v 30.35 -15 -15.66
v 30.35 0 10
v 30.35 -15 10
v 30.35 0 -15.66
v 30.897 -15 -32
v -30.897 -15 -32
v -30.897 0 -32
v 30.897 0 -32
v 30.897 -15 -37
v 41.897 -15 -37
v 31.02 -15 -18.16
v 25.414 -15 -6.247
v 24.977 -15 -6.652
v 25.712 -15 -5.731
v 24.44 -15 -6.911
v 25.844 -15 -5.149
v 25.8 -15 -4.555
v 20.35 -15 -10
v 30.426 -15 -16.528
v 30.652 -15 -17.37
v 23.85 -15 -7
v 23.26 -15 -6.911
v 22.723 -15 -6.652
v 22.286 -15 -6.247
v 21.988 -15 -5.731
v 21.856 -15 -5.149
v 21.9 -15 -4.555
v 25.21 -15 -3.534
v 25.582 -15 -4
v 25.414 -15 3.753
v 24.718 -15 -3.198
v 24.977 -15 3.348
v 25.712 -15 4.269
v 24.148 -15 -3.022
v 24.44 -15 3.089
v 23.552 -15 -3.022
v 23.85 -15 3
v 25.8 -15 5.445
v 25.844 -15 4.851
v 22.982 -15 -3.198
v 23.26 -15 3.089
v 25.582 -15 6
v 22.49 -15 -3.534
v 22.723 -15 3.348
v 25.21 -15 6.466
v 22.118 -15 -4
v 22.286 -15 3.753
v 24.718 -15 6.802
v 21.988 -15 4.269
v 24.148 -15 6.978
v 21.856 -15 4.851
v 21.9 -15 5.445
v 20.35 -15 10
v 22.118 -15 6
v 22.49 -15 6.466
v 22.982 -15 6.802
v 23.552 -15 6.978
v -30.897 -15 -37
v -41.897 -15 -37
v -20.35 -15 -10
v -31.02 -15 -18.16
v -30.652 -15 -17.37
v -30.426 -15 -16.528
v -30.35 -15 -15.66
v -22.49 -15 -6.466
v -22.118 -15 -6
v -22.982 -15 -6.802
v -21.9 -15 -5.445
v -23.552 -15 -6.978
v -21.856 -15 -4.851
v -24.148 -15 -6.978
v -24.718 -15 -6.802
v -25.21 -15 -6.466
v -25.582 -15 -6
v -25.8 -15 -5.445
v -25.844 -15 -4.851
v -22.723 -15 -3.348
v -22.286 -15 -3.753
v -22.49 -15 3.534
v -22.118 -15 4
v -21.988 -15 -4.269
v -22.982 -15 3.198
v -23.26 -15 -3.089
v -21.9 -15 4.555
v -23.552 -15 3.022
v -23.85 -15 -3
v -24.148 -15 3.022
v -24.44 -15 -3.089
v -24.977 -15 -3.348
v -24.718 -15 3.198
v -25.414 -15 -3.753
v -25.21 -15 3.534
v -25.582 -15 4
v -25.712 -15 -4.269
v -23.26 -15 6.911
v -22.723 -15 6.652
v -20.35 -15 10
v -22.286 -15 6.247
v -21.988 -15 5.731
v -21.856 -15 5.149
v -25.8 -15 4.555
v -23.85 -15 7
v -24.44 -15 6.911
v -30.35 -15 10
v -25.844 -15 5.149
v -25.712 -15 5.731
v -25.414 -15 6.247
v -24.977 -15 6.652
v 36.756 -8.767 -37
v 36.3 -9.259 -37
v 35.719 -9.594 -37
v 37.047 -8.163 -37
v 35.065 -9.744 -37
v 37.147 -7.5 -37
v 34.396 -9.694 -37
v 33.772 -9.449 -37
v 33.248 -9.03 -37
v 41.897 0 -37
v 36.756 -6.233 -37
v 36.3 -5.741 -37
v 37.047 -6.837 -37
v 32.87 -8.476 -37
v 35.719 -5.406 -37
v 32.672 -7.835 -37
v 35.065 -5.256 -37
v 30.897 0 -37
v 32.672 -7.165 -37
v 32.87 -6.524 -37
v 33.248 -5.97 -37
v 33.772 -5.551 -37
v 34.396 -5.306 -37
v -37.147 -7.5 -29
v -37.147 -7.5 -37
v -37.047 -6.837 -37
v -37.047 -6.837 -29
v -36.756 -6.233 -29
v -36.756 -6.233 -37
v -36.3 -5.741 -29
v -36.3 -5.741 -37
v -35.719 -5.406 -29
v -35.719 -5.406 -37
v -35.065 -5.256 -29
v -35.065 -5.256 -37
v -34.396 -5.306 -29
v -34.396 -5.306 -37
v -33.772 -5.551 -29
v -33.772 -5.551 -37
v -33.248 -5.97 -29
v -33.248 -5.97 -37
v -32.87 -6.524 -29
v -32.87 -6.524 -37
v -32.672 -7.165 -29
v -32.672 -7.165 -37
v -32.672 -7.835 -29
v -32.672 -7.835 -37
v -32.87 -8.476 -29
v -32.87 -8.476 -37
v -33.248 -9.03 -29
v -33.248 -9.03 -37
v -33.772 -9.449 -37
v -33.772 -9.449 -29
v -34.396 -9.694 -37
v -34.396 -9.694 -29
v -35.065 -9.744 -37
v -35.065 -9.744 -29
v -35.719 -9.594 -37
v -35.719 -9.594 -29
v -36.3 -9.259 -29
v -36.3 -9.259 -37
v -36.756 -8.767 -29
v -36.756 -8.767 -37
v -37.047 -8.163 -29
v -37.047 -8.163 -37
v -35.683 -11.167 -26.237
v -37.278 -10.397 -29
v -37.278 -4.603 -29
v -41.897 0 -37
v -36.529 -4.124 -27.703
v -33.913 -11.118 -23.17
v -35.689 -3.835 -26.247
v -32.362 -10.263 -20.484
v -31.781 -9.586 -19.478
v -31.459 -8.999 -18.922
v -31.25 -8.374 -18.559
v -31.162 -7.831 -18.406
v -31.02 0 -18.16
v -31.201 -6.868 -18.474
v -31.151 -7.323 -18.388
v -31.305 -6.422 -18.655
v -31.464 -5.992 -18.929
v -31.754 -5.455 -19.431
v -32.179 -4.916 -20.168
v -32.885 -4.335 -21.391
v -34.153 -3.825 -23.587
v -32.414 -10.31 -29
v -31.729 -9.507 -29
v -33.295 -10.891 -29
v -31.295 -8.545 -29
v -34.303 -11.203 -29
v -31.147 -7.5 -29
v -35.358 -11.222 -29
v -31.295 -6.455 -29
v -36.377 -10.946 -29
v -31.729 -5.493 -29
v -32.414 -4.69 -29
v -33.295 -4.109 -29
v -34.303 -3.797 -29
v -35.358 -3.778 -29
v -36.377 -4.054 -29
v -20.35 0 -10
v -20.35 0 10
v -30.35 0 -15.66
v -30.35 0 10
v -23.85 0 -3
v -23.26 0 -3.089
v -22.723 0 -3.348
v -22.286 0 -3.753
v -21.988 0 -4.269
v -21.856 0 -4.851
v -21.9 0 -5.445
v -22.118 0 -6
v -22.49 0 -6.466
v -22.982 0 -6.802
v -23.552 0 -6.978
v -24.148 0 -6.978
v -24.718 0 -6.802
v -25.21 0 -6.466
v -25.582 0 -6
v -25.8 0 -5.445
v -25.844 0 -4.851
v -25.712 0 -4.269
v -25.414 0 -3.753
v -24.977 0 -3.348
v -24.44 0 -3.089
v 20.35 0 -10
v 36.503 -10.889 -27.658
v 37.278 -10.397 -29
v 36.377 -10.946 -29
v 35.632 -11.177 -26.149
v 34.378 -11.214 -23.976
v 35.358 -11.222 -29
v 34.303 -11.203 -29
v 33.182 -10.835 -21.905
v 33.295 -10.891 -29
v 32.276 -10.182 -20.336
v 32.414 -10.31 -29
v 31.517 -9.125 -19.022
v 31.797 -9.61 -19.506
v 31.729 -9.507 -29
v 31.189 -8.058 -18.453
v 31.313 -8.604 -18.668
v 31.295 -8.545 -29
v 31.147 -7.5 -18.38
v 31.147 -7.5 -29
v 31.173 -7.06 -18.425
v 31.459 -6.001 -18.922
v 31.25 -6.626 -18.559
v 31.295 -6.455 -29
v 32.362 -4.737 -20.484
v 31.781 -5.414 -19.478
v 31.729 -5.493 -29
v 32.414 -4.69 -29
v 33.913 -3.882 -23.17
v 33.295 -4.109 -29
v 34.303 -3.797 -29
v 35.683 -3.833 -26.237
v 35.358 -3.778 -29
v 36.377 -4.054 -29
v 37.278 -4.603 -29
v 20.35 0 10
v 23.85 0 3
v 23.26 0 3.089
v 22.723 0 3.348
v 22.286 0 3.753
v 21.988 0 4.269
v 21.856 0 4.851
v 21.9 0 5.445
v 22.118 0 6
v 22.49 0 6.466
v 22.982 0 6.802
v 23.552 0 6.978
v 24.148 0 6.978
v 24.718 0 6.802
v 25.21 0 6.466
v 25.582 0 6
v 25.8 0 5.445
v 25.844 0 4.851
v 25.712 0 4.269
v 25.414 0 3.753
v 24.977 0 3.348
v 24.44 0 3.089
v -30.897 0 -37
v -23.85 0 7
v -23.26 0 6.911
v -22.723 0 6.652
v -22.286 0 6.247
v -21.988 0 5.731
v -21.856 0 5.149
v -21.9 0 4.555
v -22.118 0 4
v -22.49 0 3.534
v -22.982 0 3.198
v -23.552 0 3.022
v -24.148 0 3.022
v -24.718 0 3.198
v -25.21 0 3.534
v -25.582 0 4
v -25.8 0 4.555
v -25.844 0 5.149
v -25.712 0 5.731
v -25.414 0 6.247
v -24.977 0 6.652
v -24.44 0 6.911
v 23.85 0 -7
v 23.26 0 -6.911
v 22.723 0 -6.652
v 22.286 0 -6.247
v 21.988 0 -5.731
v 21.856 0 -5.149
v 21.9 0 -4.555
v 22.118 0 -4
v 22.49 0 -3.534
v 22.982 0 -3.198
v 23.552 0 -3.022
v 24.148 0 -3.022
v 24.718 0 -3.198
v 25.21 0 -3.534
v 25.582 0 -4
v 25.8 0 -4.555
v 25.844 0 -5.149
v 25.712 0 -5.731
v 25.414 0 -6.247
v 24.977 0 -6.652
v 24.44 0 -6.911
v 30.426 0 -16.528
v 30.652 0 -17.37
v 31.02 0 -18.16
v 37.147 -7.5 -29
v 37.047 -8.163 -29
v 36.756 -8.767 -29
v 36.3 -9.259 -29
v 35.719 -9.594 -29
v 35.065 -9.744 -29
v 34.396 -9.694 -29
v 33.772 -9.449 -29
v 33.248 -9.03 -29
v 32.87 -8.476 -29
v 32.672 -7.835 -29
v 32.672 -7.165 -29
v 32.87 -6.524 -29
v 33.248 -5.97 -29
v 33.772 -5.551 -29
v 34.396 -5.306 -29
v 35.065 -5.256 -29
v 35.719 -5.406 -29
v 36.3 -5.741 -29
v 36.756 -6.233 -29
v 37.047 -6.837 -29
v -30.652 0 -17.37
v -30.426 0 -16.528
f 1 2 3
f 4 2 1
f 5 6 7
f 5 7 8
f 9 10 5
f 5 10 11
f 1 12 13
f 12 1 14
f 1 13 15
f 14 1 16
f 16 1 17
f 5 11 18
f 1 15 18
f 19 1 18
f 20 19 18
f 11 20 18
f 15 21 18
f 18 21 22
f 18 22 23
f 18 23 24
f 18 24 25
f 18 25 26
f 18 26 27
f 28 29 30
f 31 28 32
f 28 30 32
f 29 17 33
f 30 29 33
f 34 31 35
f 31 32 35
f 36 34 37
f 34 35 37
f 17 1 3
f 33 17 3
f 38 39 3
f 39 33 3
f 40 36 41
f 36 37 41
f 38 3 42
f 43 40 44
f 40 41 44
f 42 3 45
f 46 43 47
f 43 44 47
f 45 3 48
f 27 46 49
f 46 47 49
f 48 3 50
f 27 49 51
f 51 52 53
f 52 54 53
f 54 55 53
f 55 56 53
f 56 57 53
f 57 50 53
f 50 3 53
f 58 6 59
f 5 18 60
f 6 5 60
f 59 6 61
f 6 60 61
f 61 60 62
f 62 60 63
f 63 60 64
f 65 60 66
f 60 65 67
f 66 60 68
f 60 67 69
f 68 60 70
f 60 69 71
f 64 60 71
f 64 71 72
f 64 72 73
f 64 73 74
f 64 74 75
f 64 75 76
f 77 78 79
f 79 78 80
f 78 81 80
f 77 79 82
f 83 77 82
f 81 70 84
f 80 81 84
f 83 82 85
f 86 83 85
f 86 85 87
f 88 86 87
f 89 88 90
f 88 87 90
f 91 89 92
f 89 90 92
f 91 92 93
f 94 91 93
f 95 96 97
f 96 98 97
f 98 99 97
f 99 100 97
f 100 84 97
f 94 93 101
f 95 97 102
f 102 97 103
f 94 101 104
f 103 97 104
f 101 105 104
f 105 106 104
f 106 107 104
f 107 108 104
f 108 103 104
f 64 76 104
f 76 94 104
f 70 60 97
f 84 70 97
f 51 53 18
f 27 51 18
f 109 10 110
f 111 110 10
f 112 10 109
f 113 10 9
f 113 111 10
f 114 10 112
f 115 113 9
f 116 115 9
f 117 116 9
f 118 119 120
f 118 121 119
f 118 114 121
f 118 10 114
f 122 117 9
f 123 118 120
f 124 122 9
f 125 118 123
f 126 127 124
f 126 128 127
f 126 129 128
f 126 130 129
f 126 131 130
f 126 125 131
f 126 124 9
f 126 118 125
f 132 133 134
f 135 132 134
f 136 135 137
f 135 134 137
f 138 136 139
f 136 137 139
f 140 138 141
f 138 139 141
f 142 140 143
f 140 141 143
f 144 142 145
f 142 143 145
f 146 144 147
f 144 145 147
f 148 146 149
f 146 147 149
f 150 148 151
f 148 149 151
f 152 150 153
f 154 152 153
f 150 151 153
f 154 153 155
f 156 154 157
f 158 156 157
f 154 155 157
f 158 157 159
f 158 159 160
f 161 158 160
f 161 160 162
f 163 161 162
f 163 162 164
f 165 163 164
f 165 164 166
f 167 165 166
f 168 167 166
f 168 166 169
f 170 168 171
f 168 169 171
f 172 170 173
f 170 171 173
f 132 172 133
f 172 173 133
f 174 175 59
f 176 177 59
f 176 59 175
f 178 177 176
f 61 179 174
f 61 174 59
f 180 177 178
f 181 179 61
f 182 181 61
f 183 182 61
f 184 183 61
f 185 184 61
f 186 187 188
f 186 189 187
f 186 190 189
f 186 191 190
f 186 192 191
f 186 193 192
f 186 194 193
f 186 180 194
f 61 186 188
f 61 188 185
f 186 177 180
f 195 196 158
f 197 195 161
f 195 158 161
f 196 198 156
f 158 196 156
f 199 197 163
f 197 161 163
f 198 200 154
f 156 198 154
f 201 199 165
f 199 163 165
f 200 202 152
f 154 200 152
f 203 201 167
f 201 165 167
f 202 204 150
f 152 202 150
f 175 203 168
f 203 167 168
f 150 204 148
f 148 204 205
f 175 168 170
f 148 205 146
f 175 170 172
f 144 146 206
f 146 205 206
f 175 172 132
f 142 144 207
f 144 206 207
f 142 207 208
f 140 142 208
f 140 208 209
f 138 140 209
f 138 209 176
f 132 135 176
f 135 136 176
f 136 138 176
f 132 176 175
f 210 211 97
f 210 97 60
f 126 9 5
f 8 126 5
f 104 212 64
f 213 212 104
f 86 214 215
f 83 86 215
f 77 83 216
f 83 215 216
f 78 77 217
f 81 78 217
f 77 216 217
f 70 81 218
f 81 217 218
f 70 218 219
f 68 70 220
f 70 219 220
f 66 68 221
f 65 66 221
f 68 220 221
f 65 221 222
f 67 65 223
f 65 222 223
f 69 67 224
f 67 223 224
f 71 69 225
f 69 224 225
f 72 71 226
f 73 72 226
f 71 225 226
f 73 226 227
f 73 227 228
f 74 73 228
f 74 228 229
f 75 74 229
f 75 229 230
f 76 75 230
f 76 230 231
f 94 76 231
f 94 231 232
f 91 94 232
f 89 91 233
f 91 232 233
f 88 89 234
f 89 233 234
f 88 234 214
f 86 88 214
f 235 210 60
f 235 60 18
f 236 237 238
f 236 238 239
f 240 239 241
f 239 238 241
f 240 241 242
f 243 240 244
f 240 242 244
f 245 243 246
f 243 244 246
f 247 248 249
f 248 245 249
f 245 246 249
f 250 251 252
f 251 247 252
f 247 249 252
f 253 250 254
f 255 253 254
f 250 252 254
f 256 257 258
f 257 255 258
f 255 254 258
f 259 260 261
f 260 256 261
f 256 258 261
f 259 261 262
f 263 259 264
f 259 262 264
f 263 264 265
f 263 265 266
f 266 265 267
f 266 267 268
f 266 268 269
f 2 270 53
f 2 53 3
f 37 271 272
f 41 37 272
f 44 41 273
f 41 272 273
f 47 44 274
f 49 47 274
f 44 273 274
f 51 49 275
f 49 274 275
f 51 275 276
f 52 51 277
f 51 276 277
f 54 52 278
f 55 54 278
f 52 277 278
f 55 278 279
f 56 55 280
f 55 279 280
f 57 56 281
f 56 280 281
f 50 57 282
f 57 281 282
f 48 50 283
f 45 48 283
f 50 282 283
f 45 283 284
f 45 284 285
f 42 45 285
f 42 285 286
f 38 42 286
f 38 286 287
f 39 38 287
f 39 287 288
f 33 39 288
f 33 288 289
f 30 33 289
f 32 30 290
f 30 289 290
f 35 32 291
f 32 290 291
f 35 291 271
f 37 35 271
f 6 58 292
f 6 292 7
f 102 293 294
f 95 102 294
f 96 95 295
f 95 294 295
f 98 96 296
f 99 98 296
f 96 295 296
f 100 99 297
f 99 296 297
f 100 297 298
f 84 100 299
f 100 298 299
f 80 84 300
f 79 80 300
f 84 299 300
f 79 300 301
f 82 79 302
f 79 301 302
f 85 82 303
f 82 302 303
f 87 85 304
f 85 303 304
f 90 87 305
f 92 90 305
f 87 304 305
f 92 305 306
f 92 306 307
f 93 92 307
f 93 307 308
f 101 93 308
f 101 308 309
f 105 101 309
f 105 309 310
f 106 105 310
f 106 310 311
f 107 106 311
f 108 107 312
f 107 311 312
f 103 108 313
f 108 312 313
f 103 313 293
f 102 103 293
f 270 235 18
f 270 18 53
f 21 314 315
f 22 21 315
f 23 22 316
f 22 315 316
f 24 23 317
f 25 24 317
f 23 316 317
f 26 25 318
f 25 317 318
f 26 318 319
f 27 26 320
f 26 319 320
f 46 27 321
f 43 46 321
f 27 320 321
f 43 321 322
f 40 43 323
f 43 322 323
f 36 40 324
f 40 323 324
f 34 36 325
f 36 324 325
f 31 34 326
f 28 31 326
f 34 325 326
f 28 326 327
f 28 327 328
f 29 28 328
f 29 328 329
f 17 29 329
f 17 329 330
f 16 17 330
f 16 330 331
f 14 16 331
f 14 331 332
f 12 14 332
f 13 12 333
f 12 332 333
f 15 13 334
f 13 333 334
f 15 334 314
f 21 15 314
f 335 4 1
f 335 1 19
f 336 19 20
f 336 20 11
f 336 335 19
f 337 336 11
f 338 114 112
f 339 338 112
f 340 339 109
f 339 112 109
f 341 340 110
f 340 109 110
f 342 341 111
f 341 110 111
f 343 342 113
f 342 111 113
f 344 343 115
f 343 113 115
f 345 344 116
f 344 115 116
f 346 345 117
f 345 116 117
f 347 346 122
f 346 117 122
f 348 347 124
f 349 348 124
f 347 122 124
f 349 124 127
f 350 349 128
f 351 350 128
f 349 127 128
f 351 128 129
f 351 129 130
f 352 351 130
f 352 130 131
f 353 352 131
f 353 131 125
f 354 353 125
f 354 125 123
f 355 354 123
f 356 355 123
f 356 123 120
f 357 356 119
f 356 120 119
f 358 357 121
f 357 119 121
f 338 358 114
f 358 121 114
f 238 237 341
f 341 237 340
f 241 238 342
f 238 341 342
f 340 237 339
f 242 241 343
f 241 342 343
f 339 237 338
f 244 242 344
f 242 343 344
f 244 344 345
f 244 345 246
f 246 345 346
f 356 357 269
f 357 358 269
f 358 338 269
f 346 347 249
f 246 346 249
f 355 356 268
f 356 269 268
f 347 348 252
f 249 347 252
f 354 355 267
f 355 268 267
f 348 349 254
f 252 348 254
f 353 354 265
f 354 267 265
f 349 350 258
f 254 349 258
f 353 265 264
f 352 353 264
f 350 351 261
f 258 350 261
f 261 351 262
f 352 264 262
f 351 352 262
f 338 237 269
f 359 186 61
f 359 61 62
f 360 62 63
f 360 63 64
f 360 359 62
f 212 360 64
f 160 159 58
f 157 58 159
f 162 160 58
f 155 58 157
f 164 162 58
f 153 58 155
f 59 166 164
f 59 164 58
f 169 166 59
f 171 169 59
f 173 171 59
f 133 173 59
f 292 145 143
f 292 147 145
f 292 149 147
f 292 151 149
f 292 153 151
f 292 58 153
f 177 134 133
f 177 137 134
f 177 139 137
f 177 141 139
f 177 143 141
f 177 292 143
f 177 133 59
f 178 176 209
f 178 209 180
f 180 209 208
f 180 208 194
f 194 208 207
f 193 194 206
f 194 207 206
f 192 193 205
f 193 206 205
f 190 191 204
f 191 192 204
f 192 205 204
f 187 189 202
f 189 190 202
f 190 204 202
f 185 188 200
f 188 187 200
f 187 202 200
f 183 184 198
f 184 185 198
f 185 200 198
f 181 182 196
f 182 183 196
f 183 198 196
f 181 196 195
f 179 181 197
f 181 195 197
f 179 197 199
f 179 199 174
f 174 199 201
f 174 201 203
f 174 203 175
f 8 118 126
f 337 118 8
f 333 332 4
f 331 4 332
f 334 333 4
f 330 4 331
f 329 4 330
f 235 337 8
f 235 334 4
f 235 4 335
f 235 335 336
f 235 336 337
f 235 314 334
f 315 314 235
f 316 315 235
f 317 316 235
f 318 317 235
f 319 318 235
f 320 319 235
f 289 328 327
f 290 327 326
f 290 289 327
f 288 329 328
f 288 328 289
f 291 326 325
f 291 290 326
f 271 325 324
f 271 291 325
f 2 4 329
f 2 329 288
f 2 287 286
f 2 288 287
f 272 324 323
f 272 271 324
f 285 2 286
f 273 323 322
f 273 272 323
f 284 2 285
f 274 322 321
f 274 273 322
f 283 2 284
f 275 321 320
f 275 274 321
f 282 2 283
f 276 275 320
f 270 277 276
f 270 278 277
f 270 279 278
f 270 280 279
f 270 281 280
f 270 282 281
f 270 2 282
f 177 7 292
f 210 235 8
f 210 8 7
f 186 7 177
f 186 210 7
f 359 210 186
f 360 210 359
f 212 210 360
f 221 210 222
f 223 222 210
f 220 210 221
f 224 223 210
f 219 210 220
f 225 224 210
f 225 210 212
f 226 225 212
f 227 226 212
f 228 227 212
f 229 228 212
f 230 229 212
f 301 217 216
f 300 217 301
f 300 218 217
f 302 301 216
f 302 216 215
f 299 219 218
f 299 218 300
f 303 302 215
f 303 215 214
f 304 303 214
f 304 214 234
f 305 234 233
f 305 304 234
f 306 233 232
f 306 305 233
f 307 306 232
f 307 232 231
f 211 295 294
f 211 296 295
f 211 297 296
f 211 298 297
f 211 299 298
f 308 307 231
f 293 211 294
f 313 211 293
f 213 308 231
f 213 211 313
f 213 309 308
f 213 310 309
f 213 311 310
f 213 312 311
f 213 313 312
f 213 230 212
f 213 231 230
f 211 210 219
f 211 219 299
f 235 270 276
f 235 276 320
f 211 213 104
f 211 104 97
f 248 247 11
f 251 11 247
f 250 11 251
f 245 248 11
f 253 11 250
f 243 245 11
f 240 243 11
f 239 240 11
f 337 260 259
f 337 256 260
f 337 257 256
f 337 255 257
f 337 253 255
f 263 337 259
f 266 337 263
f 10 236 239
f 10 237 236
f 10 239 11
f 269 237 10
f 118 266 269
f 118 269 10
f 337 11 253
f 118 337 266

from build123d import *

# Parameters (mm, degrees)
SKETCH1_R           = 2
BOSS_EXTRUDE1_DEPTH = 15
SKETCH2_R           = 2.25
CUT_EXTRUDE1_DEPTH  = 8
SKETCH3_R           = 3.75
CUT_EXTRUDE2_DEPTH  = 60.172282871
SKETCH4_W           = 61.794010768
SKETCH4_H           = 5
CUT_EXTRUDE3_DEPTH  = 58.873647372


with BuildPart() as part:
    # Sketch1 → Boss-Extrude1 (new body)
    with BuildSketch(Plane(origin=(0, 0, 0), x_dir=(-1, 0, 0), z_dir=(0, 1, 0))):
        with BuildLine():
            Line((20.35, 10), (20.35, -10))
            Line((20.35, -10), (-20.35, -10))
            Line((-20.35, -10), (-20.35, 10))
            Line((-20.35, 10), (-30.35, 10))
            Line((-30.35, 10), (-30.35, -15.660254038))
            ThreePointArc((-30.35, -15.660254038), (-30.520370869, -16.954349263), (-31.019872981, -18.160254038))
            Line((-31.019872981, -18.160254038), (-41.897005384, -37))
            Line((-41.897005384, -37), (41.897005384, -37))
            Line((41.897005384, -37), (31.019872981, -18.160254038))
            ThreePointArc((31.019872981, -18.160254038), (30.520370869, -16.954349263), (30.35, -15.660254038))
            Line((30.35, -15.660254038), (30.35, 10))
            Line((30.35, 10), (20.35, 10))
        make_face()
        with Locations(Location((23.85, -5, 0), (0, 0, 90))):
            Circle(SKETCH1_R, mode=Mode.SUBTRACT)
        with Locations(Location((23.85, 5, 0), (0, 0, 90))):
            Circle(SKETCH1_R, mode=Mode.SUBTRACT)
        with Locations(Location((-23.85, -5, 0), (0, 0, 270))):
            Circle(SKETCH1_R, mode=Mode.SUBTRACT)
        with Locations(Location((-23.85, 5, 0), (0, 0, 270))):
            Circle(SKETCH1_R, mode=Mode.SUBTRACT)
    extrude(amount=-BOSS_EXTRUDE1_DEPTH)

    # Sketch2 → Cut-Extrude1 (cut)
    with BuildSketch(Plane(origin=(0, 0, -37), x_dir=(1, 0, 0), z_dir=(0, 0, -1))):
        with Locations(Location((-34.897005384, 7.5, 0), (0, 0, 180))):
            Circle(SKETCH2_R)
        with Locations((34.897005384, 7.5)):
            Circle(SKETCH2_R)
    extrude(amount=-CUT_EXTRUDE1_DEPTH, mode=Mode.SUBTRACT)

    # Sketch3 → Cut-Extrude2 (cut, through all)
    with BuildSketch(Plane(origin=(0, 0, -29), x_dir=(-1, 0, 0), z_dir=(0, 0, -1))):
        with Locations((-34.897005384, -7.5)):
            Circle(SKETCH3_R)
        with Locations((34.897005384, -7.5)):
            Circle(SKETCH3_R)
    extrude(amount=-CUT_EXTRUDE2_DEPTH, mode=Mode.SUBTRACT)

    # Sketch4 → Cut-Extrude3 (cut, through all)
    with BuildSketch(Plane.XZ.offset(15)):
        with Locations((0, -34.5)):
            Rectangle(SKETCH4_W, SKETCH4_H)
    extrude(amount=-CUT_EXTRUDE3_DEPTH, mode=Mode.SUBTRACT)


solid = part.part
